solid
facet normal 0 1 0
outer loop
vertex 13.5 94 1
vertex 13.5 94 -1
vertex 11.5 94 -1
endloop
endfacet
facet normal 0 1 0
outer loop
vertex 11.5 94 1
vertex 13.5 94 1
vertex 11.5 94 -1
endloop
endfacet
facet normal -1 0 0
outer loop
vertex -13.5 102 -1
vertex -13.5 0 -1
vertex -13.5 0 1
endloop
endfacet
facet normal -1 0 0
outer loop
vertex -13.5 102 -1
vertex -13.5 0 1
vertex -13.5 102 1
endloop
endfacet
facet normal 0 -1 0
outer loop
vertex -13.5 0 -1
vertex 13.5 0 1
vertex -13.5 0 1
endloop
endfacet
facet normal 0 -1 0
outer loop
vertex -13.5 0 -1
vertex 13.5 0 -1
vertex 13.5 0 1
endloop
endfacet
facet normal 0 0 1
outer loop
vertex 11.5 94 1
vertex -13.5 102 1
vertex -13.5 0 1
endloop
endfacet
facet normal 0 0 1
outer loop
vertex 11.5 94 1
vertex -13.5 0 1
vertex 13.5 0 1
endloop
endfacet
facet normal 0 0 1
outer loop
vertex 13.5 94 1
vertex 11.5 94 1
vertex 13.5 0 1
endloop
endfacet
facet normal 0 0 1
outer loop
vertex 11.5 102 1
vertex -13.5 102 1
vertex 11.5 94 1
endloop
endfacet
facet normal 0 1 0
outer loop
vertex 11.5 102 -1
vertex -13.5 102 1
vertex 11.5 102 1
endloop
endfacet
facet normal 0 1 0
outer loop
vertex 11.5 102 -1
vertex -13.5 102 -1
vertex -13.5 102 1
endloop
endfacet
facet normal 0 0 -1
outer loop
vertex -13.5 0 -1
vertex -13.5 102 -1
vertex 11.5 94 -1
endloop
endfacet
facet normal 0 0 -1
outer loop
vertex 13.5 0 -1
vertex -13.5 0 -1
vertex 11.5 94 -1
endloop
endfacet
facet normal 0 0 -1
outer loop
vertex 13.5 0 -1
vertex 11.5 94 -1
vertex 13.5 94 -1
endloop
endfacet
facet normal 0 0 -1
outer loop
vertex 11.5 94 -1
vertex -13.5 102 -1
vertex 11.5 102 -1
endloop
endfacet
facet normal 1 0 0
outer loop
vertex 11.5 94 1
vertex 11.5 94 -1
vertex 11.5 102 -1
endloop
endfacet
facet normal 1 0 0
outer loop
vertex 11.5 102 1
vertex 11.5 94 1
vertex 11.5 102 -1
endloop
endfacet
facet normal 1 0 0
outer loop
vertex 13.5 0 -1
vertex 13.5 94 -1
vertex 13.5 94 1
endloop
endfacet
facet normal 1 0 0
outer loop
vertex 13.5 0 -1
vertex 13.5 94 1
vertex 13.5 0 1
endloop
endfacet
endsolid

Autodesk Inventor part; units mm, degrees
ref_plane "YZ Plane" through (0, 0, 0) normal (1, 0, 0) x (0, 1, 0)
ref_plane "XZ Plane" through (0, 0, 0) normal (0, 1, 0) x (-1, 0, 0)
ref_plane "XY Plane" through (0, 0, 0) normal (0, 0, 1) x (1, 0, 0)
sketch "Sketch1" plane through (0, 0, 0) normal (0, 0, 1) x (1, 0, 0)
  line L0 (-13.5, 102) -> (13.5, 102)
  line L1 (13.5, 102) -> (13.5, 0)
  line L2 (13.5, 0) -> (-13.5, 0)
  line L3 (-13.5, 0) -> (-13.5, 102)
  line L4 (13.5, 94) -> (-13.5, 94)
  line L5 (11.5, 94) -> (11.5, 102)
  point P0 (0, 0)
  point P1 (0, 0)
  point P2 (0, 0)
  point P3 (0, 0)
  point P4 (0, 0)
  dimension "d27" = 27
  dimension "d29" = 102
  dimension "d30" = 2
  dimension "d31" = 8
extrude "Plate1" add sketch "Sketch1" along normal mid plane 2 contours L0 L5 L4 L3 | L4 L1 L2 L3
equation "\"d29\" = 0.5 * Шстр_диам_внутр - 0.5 * Колесо_диам_3 - 2 * Thickness"
equation "\"d30\" = Thickness"
equation "\"d31\" = 0.5 * Шстр_диам_внутр - 0.5 * Колесо_диам_2 - Thickness"
equation "\"d15\" = Thickness"
equation "\"BendRadius\" = Thickness"
equation "\"BendReliefWidth\" = Thickness"
equation "\"BendReliefDepth\" = 0.5 * Thickness"
equation "\"CornerReliefSize\" = 4 * Thickness"
equation "\"MinimumRemnant\" = 2 * Thickness"
equation "\"TransitionRadius\" = BendRadius"
equation "\"JacobiRadiusSize\" = BendRadius"
equation "\"GapSize\" = Thickness"
equation "\"Шстр_диам_внутр\" = 720"
equation "\"Колесо_диам_3\" = 508"
equation "\"Thickness\" = 2"
equation "\"Колесо_диам_2\" = 700"
properties part number "DMF2.0 01 42 Gear way 2"
